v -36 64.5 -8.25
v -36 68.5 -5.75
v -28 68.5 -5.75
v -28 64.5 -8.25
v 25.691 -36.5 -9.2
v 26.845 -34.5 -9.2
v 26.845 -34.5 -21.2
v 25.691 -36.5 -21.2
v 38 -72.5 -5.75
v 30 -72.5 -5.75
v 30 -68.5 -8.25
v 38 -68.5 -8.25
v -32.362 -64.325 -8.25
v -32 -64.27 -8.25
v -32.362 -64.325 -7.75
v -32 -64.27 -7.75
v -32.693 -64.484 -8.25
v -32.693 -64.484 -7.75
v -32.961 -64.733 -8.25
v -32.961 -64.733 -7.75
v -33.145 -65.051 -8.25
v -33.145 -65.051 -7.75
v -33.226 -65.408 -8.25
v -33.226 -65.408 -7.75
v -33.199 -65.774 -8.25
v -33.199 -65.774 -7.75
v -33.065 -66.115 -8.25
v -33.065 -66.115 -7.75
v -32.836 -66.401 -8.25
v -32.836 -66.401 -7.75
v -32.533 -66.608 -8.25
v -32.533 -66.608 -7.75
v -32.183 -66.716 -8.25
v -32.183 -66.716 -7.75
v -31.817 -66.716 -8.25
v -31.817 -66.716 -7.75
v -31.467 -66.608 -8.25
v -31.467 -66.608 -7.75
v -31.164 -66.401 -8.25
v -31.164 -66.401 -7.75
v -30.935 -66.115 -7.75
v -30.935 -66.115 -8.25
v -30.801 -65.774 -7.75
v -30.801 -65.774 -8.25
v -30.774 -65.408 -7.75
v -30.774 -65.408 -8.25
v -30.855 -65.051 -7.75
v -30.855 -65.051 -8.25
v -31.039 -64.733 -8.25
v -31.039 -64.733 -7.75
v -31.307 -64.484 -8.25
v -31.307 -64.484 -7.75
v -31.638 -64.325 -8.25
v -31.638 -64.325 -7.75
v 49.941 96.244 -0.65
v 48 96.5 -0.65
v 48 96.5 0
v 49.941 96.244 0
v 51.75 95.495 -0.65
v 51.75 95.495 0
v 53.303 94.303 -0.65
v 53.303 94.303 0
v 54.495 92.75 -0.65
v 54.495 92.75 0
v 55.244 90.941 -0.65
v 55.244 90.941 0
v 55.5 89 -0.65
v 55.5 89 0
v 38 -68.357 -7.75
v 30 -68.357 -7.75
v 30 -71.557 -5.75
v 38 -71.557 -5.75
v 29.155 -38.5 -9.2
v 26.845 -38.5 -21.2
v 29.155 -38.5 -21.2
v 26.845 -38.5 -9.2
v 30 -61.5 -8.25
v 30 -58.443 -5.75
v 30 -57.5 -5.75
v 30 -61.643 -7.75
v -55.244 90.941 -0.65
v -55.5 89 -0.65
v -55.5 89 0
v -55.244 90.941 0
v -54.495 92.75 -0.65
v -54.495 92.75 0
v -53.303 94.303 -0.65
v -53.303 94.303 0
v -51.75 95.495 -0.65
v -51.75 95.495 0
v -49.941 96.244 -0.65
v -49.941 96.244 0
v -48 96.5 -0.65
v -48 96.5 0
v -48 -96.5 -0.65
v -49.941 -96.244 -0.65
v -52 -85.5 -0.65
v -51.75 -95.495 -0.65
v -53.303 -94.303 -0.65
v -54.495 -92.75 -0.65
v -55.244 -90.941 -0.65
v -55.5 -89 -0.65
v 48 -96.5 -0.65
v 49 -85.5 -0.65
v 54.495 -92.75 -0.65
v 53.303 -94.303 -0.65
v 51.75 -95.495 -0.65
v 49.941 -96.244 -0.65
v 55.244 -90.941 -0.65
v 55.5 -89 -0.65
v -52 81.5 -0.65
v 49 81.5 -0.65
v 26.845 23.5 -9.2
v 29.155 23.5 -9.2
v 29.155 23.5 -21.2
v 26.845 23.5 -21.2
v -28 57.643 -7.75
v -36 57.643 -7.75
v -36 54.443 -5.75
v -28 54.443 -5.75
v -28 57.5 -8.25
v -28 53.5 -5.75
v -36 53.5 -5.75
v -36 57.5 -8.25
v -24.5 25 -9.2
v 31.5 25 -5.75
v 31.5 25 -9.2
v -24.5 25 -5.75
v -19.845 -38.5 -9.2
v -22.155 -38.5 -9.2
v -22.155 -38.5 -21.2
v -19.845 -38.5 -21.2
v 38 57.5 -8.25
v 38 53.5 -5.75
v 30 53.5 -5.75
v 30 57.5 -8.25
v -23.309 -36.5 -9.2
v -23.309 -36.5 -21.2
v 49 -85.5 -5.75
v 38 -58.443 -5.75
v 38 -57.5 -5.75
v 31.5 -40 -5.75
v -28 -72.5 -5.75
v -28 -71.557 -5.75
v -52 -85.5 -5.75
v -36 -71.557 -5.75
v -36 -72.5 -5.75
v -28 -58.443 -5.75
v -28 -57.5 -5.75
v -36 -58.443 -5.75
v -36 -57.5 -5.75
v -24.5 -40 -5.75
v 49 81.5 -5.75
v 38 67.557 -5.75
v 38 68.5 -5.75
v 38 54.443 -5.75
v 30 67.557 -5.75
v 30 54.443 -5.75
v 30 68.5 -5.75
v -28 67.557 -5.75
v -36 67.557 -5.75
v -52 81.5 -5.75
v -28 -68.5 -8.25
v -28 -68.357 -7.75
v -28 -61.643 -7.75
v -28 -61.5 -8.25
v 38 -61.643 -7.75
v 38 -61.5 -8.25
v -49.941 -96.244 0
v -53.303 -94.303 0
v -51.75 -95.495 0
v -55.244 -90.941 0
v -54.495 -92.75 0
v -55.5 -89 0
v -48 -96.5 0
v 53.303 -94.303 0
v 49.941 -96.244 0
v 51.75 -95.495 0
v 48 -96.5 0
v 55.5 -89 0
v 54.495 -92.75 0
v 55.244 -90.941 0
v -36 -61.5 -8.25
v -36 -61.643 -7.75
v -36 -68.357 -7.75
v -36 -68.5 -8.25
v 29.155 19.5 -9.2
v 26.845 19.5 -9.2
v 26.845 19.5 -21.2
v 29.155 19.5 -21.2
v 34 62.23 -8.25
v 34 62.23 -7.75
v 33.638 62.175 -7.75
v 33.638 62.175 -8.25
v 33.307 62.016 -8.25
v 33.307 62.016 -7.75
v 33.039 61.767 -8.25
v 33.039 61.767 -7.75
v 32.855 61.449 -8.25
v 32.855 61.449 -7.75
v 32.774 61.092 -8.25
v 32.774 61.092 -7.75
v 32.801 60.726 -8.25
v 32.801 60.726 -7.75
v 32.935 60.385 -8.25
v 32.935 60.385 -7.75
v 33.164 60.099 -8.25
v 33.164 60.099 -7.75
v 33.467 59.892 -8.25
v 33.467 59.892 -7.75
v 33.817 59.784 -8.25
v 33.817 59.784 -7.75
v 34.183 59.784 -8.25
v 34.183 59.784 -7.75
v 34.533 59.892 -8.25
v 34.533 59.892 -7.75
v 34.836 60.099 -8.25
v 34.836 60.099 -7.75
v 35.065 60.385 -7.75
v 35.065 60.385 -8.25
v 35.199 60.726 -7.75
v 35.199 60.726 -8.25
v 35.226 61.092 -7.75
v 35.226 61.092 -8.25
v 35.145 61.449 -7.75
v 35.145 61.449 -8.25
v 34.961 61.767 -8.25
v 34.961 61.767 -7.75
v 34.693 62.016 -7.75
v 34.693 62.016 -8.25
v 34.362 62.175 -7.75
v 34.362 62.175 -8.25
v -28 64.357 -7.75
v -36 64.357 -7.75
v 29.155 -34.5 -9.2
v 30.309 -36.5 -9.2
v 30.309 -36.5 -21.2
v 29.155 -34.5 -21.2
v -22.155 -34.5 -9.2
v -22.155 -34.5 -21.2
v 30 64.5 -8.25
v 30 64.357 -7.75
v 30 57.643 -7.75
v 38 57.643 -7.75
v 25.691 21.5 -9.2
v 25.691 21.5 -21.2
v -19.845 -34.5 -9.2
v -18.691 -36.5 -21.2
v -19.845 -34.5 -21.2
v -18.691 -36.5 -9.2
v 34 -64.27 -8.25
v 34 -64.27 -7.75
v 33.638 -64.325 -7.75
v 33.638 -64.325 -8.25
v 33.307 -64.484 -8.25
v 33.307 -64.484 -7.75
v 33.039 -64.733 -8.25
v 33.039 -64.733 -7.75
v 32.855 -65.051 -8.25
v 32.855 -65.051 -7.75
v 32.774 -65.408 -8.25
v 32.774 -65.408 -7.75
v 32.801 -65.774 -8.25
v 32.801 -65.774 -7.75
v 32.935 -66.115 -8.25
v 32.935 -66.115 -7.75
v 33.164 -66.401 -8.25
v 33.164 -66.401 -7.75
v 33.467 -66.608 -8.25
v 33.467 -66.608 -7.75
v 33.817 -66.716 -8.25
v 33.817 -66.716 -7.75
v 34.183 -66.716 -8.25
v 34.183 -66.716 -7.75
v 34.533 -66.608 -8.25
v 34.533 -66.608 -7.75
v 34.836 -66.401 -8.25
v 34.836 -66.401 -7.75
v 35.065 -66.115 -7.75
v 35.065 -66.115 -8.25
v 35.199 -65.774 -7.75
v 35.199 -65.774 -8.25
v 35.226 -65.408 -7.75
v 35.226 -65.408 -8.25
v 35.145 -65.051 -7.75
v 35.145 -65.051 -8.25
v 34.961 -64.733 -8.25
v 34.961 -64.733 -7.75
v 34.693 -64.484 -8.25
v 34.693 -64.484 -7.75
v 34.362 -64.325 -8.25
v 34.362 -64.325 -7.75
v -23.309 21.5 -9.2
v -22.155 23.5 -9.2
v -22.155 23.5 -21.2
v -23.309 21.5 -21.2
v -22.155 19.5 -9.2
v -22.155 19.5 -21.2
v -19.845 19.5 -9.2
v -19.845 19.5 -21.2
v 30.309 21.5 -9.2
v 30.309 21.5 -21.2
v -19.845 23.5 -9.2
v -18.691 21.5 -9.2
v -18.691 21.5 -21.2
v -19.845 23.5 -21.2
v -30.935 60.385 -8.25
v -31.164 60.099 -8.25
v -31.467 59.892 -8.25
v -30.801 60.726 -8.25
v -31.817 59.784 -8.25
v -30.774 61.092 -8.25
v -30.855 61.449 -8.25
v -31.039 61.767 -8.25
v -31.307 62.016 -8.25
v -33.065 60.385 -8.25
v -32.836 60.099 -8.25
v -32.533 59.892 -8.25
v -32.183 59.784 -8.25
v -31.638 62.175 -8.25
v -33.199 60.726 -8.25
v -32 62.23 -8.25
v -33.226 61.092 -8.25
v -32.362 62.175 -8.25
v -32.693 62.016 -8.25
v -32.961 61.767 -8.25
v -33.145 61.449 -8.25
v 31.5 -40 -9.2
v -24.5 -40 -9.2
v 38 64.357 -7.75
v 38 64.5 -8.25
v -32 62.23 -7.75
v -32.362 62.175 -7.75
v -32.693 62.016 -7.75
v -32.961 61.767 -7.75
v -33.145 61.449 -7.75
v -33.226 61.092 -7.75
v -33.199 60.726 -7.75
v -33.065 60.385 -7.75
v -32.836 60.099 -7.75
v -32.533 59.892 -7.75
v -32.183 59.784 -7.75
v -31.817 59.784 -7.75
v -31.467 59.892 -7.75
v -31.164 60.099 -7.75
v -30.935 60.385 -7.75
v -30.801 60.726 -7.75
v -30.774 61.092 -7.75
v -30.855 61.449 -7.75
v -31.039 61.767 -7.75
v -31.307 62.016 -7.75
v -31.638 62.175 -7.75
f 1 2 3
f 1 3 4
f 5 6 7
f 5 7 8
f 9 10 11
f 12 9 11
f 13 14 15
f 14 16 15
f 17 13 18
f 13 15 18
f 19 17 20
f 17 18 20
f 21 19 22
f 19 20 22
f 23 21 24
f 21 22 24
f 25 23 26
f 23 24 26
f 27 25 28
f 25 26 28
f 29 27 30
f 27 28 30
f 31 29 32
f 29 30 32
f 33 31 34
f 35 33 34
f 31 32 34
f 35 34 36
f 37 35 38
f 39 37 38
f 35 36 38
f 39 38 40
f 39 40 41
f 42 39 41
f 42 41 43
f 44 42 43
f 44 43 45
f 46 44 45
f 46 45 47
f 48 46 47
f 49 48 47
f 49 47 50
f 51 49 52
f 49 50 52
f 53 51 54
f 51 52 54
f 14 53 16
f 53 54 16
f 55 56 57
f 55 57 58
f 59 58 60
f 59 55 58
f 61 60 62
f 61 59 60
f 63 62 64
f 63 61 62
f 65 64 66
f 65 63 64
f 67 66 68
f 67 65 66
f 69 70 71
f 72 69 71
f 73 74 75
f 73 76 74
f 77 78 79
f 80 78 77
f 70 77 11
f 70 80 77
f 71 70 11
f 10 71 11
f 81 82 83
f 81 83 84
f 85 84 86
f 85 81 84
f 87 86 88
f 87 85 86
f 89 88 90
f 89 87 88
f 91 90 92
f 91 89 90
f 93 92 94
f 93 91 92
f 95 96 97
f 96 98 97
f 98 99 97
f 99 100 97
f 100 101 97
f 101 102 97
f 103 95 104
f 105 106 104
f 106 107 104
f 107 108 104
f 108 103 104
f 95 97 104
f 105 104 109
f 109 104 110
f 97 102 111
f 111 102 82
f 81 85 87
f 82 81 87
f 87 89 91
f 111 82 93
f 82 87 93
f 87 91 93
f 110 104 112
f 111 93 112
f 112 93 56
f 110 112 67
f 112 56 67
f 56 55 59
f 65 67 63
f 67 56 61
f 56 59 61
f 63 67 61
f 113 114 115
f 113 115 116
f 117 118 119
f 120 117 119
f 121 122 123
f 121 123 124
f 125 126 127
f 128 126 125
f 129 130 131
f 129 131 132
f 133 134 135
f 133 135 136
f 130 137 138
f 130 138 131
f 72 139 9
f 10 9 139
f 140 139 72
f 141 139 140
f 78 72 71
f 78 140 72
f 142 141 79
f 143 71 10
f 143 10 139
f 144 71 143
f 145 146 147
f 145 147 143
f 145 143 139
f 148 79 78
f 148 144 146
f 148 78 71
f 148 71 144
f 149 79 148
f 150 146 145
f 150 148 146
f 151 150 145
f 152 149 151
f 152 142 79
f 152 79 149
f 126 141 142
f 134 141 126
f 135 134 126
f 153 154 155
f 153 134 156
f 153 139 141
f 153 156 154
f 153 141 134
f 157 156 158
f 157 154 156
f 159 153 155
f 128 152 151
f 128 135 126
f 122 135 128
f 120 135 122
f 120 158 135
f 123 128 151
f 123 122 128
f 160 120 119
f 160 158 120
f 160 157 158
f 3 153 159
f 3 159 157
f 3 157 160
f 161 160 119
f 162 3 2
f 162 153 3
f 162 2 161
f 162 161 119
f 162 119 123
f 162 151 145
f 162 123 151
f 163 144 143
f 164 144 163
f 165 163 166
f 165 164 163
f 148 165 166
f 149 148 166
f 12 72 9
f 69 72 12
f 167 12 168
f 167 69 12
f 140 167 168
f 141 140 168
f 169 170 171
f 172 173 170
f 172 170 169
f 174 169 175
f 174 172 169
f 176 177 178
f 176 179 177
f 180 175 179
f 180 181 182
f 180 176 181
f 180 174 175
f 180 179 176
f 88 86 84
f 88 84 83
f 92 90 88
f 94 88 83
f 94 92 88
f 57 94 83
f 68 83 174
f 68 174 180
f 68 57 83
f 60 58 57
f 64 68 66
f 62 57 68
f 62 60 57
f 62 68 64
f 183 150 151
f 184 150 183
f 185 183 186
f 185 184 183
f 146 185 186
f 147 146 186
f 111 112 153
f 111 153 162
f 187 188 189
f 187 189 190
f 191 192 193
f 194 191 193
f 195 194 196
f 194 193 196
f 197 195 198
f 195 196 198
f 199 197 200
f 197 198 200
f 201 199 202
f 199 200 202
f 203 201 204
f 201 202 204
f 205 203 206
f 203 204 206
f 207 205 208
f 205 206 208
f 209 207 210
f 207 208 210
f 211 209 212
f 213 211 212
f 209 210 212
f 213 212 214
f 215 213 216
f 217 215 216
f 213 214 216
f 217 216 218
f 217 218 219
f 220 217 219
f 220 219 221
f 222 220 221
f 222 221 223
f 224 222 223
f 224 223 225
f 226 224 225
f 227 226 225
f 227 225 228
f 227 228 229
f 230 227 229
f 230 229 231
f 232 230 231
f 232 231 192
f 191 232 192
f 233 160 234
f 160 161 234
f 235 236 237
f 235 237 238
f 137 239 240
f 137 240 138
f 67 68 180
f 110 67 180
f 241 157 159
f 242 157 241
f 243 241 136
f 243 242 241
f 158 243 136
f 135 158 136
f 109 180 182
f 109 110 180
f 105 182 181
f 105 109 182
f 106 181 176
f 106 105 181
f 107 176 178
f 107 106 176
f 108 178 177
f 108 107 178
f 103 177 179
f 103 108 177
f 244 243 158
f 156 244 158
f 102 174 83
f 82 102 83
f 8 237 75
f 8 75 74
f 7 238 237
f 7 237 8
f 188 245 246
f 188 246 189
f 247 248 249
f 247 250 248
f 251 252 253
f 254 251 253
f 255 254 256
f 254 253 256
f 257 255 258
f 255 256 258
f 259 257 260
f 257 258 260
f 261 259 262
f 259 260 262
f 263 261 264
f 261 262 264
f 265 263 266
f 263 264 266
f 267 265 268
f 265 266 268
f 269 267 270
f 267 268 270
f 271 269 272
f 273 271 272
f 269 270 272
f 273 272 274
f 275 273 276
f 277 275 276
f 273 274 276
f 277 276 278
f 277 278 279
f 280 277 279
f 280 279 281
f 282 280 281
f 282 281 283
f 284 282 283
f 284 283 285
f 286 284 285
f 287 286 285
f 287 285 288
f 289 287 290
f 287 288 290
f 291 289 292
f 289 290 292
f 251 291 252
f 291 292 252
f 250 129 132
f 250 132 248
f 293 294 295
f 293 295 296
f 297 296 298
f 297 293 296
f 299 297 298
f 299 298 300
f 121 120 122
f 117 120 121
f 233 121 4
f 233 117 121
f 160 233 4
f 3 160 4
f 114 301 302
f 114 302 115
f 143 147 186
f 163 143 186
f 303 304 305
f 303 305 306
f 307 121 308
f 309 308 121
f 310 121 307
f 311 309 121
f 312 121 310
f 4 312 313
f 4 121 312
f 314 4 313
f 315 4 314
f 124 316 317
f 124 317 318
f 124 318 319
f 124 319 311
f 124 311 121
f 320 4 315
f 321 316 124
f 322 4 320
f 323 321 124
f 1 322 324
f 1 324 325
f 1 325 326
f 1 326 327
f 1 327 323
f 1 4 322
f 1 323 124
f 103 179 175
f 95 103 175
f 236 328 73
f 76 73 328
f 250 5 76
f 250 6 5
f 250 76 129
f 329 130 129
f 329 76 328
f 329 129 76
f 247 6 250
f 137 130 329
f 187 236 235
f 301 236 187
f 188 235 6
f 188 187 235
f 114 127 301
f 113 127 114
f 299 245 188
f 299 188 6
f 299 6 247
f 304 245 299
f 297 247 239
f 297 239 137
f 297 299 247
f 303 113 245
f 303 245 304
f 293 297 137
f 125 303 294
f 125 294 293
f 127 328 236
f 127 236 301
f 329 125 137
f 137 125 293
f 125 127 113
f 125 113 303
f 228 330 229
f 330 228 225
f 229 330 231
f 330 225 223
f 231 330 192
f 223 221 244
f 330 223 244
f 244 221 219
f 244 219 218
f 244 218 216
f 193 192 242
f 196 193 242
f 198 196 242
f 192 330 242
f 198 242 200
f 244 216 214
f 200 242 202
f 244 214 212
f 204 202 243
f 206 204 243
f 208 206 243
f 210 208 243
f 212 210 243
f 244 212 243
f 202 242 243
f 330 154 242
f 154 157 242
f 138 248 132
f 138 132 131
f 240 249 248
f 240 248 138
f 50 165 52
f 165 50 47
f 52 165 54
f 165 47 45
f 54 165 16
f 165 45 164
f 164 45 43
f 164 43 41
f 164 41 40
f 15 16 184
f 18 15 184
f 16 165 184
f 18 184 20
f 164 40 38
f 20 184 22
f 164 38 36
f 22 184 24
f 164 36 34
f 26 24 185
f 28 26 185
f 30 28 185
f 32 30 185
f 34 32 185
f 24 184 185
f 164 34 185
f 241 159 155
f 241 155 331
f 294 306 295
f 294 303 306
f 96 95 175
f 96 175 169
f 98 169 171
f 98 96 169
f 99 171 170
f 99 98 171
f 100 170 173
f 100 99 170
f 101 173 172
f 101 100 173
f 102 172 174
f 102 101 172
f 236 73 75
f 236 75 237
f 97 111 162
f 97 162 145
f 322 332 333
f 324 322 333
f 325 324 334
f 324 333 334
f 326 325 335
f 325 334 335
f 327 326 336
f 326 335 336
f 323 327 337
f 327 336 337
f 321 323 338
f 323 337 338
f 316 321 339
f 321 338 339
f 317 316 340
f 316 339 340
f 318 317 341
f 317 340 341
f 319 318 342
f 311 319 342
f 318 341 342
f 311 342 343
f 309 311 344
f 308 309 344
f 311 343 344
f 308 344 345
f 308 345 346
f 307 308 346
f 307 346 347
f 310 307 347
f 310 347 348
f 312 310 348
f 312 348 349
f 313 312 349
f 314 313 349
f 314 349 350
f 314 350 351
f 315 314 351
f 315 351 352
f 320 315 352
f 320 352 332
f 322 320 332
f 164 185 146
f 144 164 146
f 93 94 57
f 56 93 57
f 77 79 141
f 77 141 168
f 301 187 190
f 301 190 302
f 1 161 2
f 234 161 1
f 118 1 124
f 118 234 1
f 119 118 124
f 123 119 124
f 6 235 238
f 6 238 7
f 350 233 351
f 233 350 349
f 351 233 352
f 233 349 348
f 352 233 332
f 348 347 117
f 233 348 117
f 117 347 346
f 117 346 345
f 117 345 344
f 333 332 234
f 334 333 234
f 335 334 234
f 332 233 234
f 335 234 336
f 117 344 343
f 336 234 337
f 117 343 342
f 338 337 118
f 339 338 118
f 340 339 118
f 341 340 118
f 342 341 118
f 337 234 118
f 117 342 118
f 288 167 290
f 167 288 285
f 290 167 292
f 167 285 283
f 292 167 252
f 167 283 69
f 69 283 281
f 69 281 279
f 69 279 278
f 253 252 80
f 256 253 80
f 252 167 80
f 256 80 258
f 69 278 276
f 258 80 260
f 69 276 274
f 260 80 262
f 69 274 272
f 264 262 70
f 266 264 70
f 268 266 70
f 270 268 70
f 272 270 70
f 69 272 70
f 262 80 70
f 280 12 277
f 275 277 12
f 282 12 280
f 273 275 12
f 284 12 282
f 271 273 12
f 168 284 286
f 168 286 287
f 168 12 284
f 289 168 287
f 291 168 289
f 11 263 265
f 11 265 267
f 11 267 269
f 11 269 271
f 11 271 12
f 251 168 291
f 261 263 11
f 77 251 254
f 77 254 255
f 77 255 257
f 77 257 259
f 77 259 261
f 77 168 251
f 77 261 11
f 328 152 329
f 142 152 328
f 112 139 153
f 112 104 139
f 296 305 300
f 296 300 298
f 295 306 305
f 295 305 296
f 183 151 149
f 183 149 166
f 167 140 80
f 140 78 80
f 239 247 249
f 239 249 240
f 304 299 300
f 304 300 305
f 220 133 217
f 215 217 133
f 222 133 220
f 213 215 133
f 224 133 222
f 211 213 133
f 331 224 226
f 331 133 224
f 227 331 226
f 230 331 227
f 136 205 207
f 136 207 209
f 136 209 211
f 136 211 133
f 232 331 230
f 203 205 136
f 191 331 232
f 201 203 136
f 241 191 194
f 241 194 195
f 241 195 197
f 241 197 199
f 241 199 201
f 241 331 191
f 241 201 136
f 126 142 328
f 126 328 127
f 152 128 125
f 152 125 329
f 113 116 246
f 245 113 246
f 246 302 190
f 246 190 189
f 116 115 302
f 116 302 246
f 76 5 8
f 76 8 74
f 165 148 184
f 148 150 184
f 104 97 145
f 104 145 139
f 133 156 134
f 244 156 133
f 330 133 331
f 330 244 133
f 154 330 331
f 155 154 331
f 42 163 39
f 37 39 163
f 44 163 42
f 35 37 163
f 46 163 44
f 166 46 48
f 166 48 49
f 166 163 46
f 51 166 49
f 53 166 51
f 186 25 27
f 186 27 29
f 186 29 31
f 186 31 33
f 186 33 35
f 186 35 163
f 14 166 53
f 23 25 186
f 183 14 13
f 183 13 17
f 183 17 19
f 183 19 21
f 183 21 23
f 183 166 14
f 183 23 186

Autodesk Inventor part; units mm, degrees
ref_plane "YZ Plane" through (0, 0, 0) normal (1, 0, 0) x (0, 1, 0)
ref_plane "XZ Plane" through (0, 0, 0) normal (0, 1, 0) x (-1, 0, 0)
ref_plane "XY Plane" through (0, 0, 0) normal (0, 0, 1) x (1, 0, 0)
sketch "Skizze1" plane through (0, 0, 0) normal (0, 0, 1) x (1, 0, 0)
  line L0 (-55.5, 96.5) -> (55.5, 96.5)
  line L1 (55.5, 96.5) -> (55.5, -96.5)
  line L2 (55.5, -96.5) -> (-55.5, -96.5)
  line L3 (-55.5, -96.5) -> (-55.5, 96.5)
  point P0 (0, 0)
  point P1 (0, 96.5)
  point P2 (-55.5, 0)
  dimension "d0" = 111
  dimension "d1" = 193
extrude "Extrusion1" add sketch "Skizze1" against normal blind 0.65
sketch "Skizze3" plane through (0, 0, 0) normal (0, 0, 1) x (1, 0, 0)
  line L0 (-42.5, 77.5) -> (44.5, 77.5)
  line L1 (44.5, 77.5) -> (44.5, -77.5)
  line L2 (44.5, -77.5) -> (-42.5, -77.5)
  line L3 (-42.5, -77.5) -> (-42.5, 77.5)
  line L4 (55.5, 96.5) -> (-55.5, 96.5) projected
  line L5 (-55.5, -96.5) -> (55.5, -96.5) projected
  line L6 (-55.5, 96.5) -> (-55.5, -96.5) projected
  point P0 (0, 0)
  dimension "d11" = 155
  dimension "d12" = 19
  dimension "d13" = 19
  dimension "d14" = 87
  dimension "d15" = 13
split_face "Trennen1"
fillet "Rundung1" radius 7.5 4 edges at (-55.5, -96.5, -0.325) (55.5, -96.5, -0.325) (55.5, 96.5, -0.325) (-55.5, 96.5, -0.325)
sketch "Skizze2" plane through (0, 0, -0.65) normal (0, 0, -1) x (-1, 0, 0)
  line L0 (-49, 81.5) -> (52, 81.5)
  line L1 (52, 81.5) -> (52, -85.5)
  line L2 (52, -85.5) -> (-49, -85.5)
  line L3 (-49, -85.5) -> (-49, 81.5)
  line L4 (55.5, -96.5) -> (55.5, 96.5) projected
  line L5 (55.5, 96.5) -> (-55.5, 96.5) projected
  point P0 (0, 0)
  dimension "d5" = 101
  dimension "d6" = 167
  dimension "d7" = 3.5
  dimension "d8" = 15
extrude "Extrusion2" add sketch "Skizze2" along normal blind 5.1
sketch "Skizze6" plane through (0, 0, -5.75) normal (0, 0, -1) x (-1, 0, 0)
  line L0 (-38, 68.5) -> (-30, 68.5)
  line L1 (-30, 68.5) -> (-30, 53.5)
  line L2 (-30, 53.5) -> (-38, 53.5)
  line L3 (-38, 53.5) -> (-38, 68.5)
  line L4 (28, 68.5) -> (36, 68.5)
  line L5 (36, 68.5) -> (36, 53.5)
  line L6 (36, 53.5) -> (28, 53.5)
  line L7 (28, 53.5) -> (28, 68.5)
  line L8 (-38, -57.5) -> (-30, -57.5)
  line L9 (-30, -57.5) -> (-30, -72.5)
  line L10 (-30, -72.5) -> (-38, -72.5)
  line L11 (-38, -72.5) -> (-38, -57.5)
  line L12 (28, -57.5) -> (36, -57.5)
  line L13 (36, -57.5) -> (36, -72.5)
  line L14 (36, -72.5) -> (28, -72.5)
  line L15 (28, -72.5) -> (28, -57.5)
  line L16 (-49, 81.5) -> (-49, -85.5) projected
  line L17 (52, 81.5) -> (-49, 81.5) projected
  line L18 (52, -85.5) -> (52, 81.5) projected
  line L19 (-49, -85.5) -> (52, -85.5) projected
  point P0 (0, 0)
  dimension "d35" = 8
  dimension "d36" = 15
  dimension "d37" = 11
  dimension "d38" = 13
  dimension "d39" = 16
  dimension "d40" = 13
extrude "Extrusion5" add sketch "Skizze6" along normal blind 2.5 contours L0 L1 L2 L3 | L4 L5 L6 L7 | L8 L9 L10 L11 | L12 L13 L14 L15
sketch "Skizze7" plane through (0, 0, -8.25) normal (0, 0, -1) x (-1, 0, 0)
  line L0 (-30, 68.5) -> (-38, 68.5) projected
  line L1 (-38, 68.5) -> (-38, 53.5) projected
  point P0 (0, 0)
  point P1 (-34, 61)
  point P2 (32, 61)
  point P3 (32, -65.5)
  point P4 (-34, -65.5)
  point P5 (-34, 68.5)
  point P6 (-38, 61)
  dimension "d43" = 126.5
  dimension "d44" = 66
sketch "Skizze8" plane through (38, 53.5, -5.75) normal (1, 0, 0) x (0, 0, -1)
  line L0 (0, 15) -> (2.5, 15) projected
  line L1 (0, 0) -> (2.5, 0) projected
  line L2 (0, -111) -> (2.5, -111) projected
  line L3 (0, -126) -> (2.5, -126) projected
  line L4 (2.5, -111) -> (2.5, -126) projected
  line L5 (0, -111) -> (2.5, -115)
  line L6 (2.5, -111) -> (2.5, -126) projected
  line L7 (0, -126) -> (2.5, -126) projected
  line L8 (0, -126) -> (2.5, -122)
  line L9 (0, 15) -> (0, 0) projected
  line L10 (0, 0) -> (2.5, 4)
  line L11 (2.5, 0) -> (2.5, 15) projected
  line L12 (0, 15) -> (2.5, 15) projected
  line L13 (0, 15) -> (2.5, 11)
  line L14 (0, 28) -> (0, -139) projected
  line L15 (0, 14.0566) -> (2, 10.8566)
  line L16 (2, 10.8566) -> (2, 4.1434)
  line L17 (2, 4.1434) -> (0, 0.9434)
  line L18 (0, -126) -> (0, -111) projected
  line L19 (0, -111.9434) -> (2, -115.1434)
  line L20 (2, -115.1434) -> (2, -121.8566)
  line L21 (2, -121.8566) -> (0, -125.0566)
  point P0 (-5.75, -53.5)
  point P1 (0, -111.9434)
  point P2 (0, 14.0566)
  point P3 (0, 0.9434)
  dimension "d45" = 7
  dimension "d46" = 0.5
  dimension "d47" = 0.5
  dimension "d48" = 0.5
  dimension "d49" = 0.5
extrude "Extrusion6" cut sketch "Skizze8" along normal through all both and the other way through all contours L2 L4 L5 | L0 L11 L13 | L15 L16 L17 L9 | L11 L1 L10 | L19 L20 L21 L14 | L4 L3 L8
hole "Bohrung1" at (34, 61, -8.25) at (-32, 61, -8.25) at (-32, -65.5, -8.25) at (34, -65.5, -8.25) direction (0, 0, 1) diameter 2.459 depth 0.5 thread size "M3x0.5" class "6H" standard "ISO Metric profile"
sketch "Skizze4" plane through (0, 0, -5.75) normal (0, 0, -1) x (-1, 0, 0)
  line L0 (-31.5, 25) -> (24.5, 25)
  line L1 (24.5, 25) -> (24.5, -40)
  line L2 (24.5, -40) -> (-31.5, -40)
  line L3 (-31.5, -40) -> (-31.5, 25)
  line L4 (-49, -85.5) -> (52, -85.5) projected
  line L5 (-49, 81.5) -> (-49, -85.5) projected
  point P0 (0, 0)
  dimension "d17" = 45.5
  dimension "d18" = 65
  dimension "d19" = 56
  dimension "d20" = 17.5
extrude "Extrusion3" add sketch "Skizze4" along normal blind 3.45
sketch "Skizze5" plane through (0, 0, -9.2) normal (0, 0, -1) x (-1, 0, 0)
  line L0 (-26.8453, -34.5) -> (-25.6906, -36.5)
  line L1 (-25.6906, -36.5) -> (-26.8453, -38.5)
  line L2 (-26.8453, -38.5) -> (-29.1547, -38.5)
  line L3 (-29.1547, -38.5) -> (-30.3094, -36.5)
  line L4 (-30.3094, -36.5) -> (-29.1547, -34.5)
  line L5 (-29.1547, -34.5) -> (-26.8453, -34.5)
  line L6 (-26.8453, 23.5) -> (-25.6906, 21.5)
  line L7 (-25.6906, 21.5) -> (-26.8453, 19.5)
  line L8 (-26.8453, 19.5) -> (-29.1547, 19.5)
  line L9 (-29.1547, 19.5) -> (-30.3094, 21.5)
  line L10 (-30.3094, 21.5) -> (-29.1547, 23.5)
  line L11 (-29.1547, 23.5) -> (-26.8453, 23.5)
  line L12 (22.1547, 23.5) -> (23.3094, 21.5)
  line L13 (23.3094, 21.5) -> (22.1547, 19.5)
  line L14 (22.1547, 19.5) -> (19.8453, 19.5)
  line L15 (19.8453, 19.5) -> (18.6906, 21.5)
  line L16 (18.6906, 21.5) -> (19.8453, 23.5)
  line L17 (19.8453, 23.5) -> (22.1547, 23.5)
  line L18 (22.1547, -34.5) -> (23.3094, -36.5)
  line L19 (23.3094, -36.5) -> (22.1547, -38.5)
  line L20 (22.1547, -38.5) -> (19.8453, -38.5)
  line L21 (19.8453, -38.5) -> (18.6906, -36.5)
  line L22 (18.6906, -36.5) -> (19.8453, -34.5)
  line L23 (19.8453, -34.5) -> (22.1547, -34.5)
  line L24 (24.5, 25) -> (-31.5, 25) projected
  line L25 (-31.5, -40) -> (24.5, -40) projected
  line L26 (24.5, -40) -> (24.5, 25) projected
  line L27 (-31.5, 25) -> (-31.5, -40) projected
  point P0 (0, 0)
  point P1 (-28, -36.5)
  point P2 (-28, 21.5)
  point P3 (21, 21.5)
  point P4 (21, -36.5)
  point P5 (-28, 21.5)
  point P6 (21, 21.5)
  point P7 (21, -36.5)
  point P8 (-28, -36.5)
  dimension "d23" = 4
  dimension "d24" = 4
  dimension "d25" = 4
  dimension "d26" = 4
  dimension "d27" = 49
  dimension "d28" = 58
  dimension "d29" = 65
  dimension "d30" = 3.5
  dimension "d31" = 56
  dimension "d32" = 3.5
extrude "Extrusion4" add sketch "Skizze5" along normal blind 12 contours L0 L1 L2 L3 L4 L5 | L6 L7 L8 L9 L10 L11 | L12 L13 L14 L15 L16 L17 | L18 L19 L20 L21 L22 L23
equation "\"d47\" = d46"
equation "\"d48\" = d47"
equation "\"d49\" = d48"
equation "\"d30\" = -0.5 * d28 + 0.5 * d29"
equation "\"d32\" = -0.5 * d27 + 0.5 * d31"
properties part number "display"
